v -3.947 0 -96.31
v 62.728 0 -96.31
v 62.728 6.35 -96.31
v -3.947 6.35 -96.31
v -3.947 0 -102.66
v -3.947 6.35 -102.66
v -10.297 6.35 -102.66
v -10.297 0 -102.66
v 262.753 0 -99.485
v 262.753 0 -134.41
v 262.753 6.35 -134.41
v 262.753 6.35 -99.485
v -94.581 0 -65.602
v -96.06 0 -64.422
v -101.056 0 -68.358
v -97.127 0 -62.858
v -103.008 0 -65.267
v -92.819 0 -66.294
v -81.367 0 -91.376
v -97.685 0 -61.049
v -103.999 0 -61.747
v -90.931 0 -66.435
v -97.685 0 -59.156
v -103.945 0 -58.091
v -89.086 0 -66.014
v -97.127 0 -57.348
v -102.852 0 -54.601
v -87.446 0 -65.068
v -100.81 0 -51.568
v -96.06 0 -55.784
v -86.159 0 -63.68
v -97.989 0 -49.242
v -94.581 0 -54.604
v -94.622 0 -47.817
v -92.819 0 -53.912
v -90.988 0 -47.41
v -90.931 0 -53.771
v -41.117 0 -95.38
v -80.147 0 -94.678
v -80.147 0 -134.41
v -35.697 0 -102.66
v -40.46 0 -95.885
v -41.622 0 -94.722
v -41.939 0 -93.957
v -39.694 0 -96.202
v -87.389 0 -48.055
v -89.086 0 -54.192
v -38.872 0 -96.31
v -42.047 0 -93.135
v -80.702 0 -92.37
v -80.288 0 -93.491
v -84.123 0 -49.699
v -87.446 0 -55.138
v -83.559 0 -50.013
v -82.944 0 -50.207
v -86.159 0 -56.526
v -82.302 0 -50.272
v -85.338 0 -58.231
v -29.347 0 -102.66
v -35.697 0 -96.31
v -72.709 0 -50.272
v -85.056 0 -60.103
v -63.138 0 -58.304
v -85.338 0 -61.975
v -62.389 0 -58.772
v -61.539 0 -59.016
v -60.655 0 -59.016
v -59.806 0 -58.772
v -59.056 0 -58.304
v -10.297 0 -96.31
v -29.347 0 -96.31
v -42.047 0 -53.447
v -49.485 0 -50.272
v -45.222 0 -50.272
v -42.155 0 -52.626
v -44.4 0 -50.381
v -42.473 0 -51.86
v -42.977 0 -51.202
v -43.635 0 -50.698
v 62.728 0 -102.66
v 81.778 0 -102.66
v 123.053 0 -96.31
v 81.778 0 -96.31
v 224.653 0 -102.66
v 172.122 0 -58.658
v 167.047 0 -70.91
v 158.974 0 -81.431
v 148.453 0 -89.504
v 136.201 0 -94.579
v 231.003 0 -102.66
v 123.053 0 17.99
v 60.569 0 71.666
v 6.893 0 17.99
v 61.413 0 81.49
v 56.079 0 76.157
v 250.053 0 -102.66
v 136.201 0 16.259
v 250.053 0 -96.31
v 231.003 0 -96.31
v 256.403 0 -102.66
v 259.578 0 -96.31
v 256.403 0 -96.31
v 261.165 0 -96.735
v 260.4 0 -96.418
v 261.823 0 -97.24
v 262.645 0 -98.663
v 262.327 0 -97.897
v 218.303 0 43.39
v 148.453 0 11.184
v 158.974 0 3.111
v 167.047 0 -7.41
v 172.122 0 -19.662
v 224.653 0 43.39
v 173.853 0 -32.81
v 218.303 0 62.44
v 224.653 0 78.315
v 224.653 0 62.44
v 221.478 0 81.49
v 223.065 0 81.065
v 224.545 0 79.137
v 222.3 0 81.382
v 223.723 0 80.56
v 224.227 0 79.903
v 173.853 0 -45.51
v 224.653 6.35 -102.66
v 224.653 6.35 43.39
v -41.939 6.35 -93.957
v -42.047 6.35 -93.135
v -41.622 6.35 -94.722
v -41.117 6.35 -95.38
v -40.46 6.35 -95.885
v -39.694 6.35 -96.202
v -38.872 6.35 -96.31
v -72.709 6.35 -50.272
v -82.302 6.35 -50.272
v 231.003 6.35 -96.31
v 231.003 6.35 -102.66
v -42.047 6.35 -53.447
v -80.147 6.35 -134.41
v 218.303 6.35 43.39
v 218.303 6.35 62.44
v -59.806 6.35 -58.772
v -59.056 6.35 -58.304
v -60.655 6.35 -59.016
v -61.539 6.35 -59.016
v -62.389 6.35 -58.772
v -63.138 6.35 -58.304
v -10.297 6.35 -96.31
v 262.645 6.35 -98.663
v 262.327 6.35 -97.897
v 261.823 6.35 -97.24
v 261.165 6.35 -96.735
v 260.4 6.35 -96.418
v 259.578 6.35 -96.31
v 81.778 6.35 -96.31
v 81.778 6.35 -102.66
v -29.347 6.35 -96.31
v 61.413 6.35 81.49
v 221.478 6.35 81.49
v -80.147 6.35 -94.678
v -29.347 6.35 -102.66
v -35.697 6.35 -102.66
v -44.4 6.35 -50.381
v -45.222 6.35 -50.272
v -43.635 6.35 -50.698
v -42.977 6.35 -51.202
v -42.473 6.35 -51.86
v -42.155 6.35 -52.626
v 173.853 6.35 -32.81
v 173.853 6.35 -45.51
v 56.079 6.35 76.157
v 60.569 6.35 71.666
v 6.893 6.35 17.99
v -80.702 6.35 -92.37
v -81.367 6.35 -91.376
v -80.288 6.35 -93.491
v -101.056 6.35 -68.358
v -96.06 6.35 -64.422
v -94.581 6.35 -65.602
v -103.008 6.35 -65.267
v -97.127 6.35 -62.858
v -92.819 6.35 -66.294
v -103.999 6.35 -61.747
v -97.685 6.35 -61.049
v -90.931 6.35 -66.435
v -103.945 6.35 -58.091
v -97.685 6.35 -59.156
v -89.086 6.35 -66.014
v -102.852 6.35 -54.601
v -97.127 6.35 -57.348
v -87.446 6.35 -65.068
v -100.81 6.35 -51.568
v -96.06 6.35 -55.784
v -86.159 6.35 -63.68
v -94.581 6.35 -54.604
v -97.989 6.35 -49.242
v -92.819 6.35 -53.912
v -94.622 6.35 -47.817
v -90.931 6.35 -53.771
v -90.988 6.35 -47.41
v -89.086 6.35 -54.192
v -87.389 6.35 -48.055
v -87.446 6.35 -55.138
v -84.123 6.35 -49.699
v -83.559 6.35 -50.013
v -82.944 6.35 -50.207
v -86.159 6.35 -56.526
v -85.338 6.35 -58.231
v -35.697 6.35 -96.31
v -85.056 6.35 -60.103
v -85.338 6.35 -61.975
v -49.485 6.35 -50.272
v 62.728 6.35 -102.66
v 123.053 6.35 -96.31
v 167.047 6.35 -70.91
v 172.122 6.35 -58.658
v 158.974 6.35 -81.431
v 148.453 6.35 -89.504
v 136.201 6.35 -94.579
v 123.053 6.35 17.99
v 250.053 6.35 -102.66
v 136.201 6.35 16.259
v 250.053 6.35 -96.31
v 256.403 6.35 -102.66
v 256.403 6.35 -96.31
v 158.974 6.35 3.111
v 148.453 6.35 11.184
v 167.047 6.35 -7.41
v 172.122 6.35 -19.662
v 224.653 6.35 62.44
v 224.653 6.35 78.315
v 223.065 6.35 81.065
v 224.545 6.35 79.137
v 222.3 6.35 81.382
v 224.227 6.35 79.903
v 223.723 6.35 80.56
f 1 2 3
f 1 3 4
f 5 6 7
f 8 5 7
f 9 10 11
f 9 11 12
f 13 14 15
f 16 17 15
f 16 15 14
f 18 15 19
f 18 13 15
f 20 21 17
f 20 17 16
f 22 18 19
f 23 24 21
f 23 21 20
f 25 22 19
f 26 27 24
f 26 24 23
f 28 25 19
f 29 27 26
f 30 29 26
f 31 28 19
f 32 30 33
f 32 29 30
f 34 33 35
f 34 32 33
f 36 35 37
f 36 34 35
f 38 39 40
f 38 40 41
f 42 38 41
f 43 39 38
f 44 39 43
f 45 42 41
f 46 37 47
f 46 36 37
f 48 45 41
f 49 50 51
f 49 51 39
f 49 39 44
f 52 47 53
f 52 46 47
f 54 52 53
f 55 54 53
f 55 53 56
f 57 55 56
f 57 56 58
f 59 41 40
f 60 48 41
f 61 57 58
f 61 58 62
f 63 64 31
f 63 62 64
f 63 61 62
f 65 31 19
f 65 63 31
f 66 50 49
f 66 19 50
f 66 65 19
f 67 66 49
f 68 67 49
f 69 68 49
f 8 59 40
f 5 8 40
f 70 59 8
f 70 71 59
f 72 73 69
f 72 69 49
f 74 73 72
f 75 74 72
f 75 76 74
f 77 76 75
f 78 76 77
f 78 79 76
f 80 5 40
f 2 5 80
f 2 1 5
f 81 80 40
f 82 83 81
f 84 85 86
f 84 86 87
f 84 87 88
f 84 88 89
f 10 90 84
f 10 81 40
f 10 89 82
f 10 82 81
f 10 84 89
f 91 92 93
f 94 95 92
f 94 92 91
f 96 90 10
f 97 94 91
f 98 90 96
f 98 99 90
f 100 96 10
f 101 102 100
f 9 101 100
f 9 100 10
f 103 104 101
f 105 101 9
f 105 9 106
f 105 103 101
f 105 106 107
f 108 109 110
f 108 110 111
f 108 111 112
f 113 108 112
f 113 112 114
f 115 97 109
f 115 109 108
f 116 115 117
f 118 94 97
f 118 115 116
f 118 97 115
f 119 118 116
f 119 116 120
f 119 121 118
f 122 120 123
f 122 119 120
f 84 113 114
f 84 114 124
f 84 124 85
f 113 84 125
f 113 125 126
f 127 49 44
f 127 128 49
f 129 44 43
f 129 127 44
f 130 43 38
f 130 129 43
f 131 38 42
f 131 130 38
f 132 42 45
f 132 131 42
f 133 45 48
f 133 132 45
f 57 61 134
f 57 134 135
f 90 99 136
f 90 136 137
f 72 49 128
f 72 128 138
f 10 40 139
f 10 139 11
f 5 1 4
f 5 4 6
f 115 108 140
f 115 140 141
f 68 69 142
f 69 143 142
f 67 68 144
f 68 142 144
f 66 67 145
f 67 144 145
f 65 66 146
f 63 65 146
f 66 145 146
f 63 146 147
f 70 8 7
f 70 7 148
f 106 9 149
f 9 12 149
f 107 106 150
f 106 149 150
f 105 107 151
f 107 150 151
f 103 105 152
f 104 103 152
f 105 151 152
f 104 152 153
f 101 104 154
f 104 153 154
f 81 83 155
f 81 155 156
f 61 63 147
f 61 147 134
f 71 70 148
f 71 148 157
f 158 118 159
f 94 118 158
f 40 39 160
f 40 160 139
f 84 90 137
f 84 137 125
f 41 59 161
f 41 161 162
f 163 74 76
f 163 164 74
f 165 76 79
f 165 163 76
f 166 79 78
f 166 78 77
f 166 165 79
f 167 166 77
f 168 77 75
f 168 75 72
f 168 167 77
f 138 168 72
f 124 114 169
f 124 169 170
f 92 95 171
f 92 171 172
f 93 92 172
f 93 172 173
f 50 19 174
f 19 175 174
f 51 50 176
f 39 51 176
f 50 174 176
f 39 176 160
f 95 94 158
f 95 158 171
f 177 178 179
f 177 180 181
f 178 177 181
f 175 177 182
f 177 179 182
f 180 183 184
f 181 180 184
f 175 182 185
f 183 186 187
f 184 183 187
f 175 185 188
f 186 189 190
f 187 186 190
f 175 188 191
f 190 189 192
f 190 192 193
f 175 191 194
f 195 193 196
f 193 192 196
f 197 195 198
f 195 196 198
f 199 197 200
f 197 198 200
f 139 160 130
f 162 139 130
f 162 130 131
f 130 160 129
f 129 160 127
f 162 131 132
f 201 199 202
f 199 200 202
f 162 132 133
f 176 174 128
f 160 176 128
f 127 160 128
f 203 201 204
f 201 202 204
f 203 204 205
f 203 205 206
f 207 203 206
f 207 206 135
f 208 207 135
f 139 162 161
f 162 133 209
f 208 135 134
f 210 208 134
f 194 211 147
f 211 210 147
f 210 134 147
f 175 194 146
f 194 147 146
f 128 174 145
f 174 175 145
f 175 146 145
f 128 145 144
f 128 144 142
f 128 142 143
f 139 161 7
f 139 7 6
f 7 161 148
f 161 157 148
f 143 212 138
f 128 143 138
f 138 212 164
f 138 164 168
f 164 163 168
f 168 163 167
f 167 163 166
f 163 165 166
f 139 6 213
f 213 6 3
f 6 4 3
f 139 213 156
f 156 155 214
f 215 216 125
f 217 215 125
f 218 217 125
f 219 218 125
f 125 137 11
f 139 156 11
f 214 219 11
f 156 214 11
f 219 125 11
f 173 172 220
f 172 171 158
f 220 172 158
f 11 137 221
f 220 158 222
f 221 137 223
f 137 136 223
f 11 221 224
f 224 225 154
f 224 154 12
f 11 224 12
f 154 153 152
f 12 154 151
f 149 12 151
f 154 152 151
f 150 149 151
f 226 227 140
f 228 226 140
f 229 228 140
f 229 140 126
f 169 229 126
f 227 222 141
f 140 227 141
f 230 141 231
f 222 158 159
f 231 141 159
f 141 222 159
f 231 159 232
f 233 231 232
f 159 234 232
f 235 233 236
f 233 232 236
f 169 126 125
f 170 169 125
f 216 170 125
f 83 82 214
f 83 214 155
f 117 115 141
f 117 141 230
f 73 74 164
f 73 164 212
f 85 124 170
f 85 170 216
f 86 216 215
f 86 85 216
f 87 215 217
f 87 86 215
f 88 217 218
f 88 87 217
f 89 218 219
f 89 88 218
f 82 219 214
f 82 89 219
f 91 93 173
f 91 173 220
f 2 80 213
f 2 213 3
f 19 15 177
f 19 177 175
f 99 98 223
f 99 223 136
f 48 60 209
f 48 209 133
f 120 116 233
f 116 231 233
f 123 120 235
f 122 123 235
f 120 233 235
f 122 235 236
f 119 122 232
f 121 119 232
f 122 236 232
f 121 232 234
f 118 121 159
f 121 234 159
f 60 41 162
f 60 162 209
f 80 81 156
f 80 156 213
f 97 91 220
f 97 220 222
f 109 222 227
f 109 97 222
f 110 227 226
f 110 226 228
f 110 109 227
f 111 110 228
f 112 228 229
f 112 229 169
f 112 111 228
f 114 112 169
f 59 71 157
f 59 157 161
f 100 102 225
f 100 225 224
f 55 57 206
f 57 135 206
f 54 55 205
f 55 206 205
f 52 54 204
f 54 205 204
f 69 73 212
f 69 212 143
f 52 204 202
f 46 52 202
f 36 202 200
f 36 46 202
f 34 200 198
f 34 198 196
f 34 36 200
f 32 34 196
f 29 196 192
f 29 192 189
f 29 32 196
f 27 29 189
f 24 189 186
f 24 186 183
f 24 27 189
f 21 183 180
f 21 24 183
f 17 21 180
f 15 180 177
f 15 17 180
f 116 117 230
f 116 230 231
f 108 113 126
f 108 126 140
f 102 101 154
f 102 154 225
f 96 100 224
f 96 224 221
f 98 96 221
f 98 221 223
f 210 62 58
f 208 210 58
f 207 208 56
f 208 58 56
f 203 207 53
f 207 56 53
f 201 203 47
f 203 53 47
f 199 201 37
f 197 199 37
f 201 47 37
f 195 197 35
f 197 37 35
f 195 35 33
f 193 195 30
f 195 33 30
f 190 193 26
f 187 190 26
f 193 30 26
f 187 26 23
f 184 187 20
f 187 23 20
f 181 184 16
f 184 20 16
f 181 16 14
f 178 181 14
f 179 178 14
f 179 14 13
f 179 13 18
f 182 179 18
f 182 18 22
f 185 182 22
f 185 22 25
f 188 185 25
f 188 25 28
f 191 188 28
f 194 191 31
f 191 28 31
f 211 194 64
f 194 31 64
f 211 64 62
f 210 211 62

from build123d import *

# Parameters (mm, degrees)
F0_R     = 6.35
F1_DEPTH = 6.35
F2_R     = 3.175
F3_R     = 5.08
F4_R     = 3.175
F5_R     = 3.175


# Not quite as in the source:
# - ends of sketch curves that miss each other by under 0.0002 mm in the source are joined


with BuildPart() as f1:
    # F0 (on Front) → F1 (new body)
    with BuildSketch(Plane.XZ):
        with BuildLine():
            Line((-72.7094654823, -50.272475262), (-83.3648741359, -50.272475262))
            ThreePointArc((-83.3648741359, -50.272475262), (-100.4842470659, -51.222143603), (-101.056400417, -68.3582903151))
            Line((-101.056400417, -68.3582903151), (-80.147210941, -92.8018072064))
            Line((-80.147210941, -92.8018072064), (-80.147210941, -134.409975262))
            Line((-80.147210941, -134.409975262), (262.752789059, -134.409975262))
            Line((262.752789059, -134.409975262), (262.752789059, -96.309975262))
            Line((262.752789059, -96.309975262), (256.402789059, -96.309975262))
            Line((256.402789059, -96.309975262), (256.402789059, -102.659975262))
            Line((256.402789059, -102.659975262), (250.052789059, -102.659975262))
            Line((250.052789059, -102.659975262), (250.052789059, -96.309975262))
            Line((250.052789059, -96.309975262), (231.002789059, -96.309975262))
            Line((231.002789059, -96.309975262), (231.002789059, -102.659975262))
            Line((231.002789059, -102.659975262), (224.652789059, -102.659975262))
            Line((224.652789059, -102.659975262), (224.652789059, 43.390024738))
            Line((224.652789059, 43.390024738), (218.302789059, 43.390024738))
            Line((218.302789059, 43.390024738), (218.302789059, 62.440024738))
            Line((218.302789059, 62.440024738), (224.652789059, 62.440024738))
            Line((224.652789059, 62.440024738), (224.652789059, 81.490024738))
            Line((224.652789059, 81.490024738), (61.4126609984, 81.490024738))
            Line((61.4126609984, 81.490024738), (56.0792184251, 76.1565821646))
            Line((56.0792184251, 76.1565821646), (60.5693464856, 71.6664541041))
            Line((60.5693464856, 71.6664541041), (6.8929171195, 17.990024738))
            Line((6.8929171195, 17.990024738), (123.052789059, 17.990024738))
            ThreePointArc((123.052789059, 17.990024738), (158.9738135432, 3.1110492223), (173.852789059, -32.809975262))
            Line((173.852789059, -32.809975262), (173.852789059, -45.509975262))
            ThreePointArc((173.852789059, -45.509975262), (158.9738135432, -81.4309997463), (123.052789059, -96.309975262))
            Line((123.052789059, -96.309975262), (81.777789059, -96.309975262))
            Line((81.777789059, -96.309975262), (81.777789059, -102.659975262))
            Line((81.777789059, -102.659975262), (62.727789059, -102.659975262))
            Line((62.727789059, -102.659975262), (62.727789059, -96.309975262))
            Line((62.727789059, -96.309975262), (-3.947210941, -96.309975262))
            Line((-3.947210941, -96.309975262), (-3.947210941, -102.659975262))
            Line((-3.947210941, -102.659975262), (-10.297210941, -102.659975262))
            Line((-10.297210941, -102.659975262), (-10.297210941, -96.309975262))
            Line((-10.297210941, -96.309975262), (-29.347210941, -96.309975262))
            Line((-29.347210941, -96.309975262), (-29.347210941, -102.659975262))
            Line((-29.347210941, -102.659975262), (-35.697210941, -102.659975262))
            Line((-35.697210941, -102.659975262), (-35.697210941, -96.309975262))
            Line((-35.697210941, -96.309975262), (-42.047210941, -96.309975262))
            Line((-42.047210941, -96.309975262), (-42.047210941, -50.272475262))
            Line((-42.047210941, -50.272475262), (-49.4849563998, -50.272475262))
            Line((-49.4849563998, -50.272475262), (-61.097210941, -60.0163137647))
            Line((-61.097210941, -60.0163137647), (-72.7094654823, -50.272475262))
        make_face()
        with Locations((-91.4055753496, -60.1028935639)):
            Circle(F0_R, mode=Mode.SUBTRACT)
    extrude(amount=-F1_DEPTH)

    # F2
    f2_edges = [f1.edges().sort_by_distance(p)[0] for p in [
        (224.652789, 3.175, 81.490025),
        (-42.047211, 3.175, -96.309975),
    ]]
    fillet(f2_edges, radius=F2_R)

    # F3
    f3_edges = [f1.edges().sort_by_distance(p)[0] for p in [
        (-80.147211, 3.175, -92.801807),
    ]]
    fillet(f3_edges, radius=F3_R)

    # F4
    f4_edges = [f1.edges().sort_by_distance(p)[0] for p in [
        (-42.047211, 3.175, -50.272475),
    ]]
    fillet(f4_edges, radius=F4_R)

    # F5
    f5_edges = [f1.edges().sort_by_distance(p)[0] for p in [
        (-61.097211, 3.175, -60.016314),
        (-83.364874, 3.175, -50.272475),
        (262.752789, 3.175, -96.309975),
    ]]
    fillet(f5_edges, radius=F5_R)


solid = f1.part
